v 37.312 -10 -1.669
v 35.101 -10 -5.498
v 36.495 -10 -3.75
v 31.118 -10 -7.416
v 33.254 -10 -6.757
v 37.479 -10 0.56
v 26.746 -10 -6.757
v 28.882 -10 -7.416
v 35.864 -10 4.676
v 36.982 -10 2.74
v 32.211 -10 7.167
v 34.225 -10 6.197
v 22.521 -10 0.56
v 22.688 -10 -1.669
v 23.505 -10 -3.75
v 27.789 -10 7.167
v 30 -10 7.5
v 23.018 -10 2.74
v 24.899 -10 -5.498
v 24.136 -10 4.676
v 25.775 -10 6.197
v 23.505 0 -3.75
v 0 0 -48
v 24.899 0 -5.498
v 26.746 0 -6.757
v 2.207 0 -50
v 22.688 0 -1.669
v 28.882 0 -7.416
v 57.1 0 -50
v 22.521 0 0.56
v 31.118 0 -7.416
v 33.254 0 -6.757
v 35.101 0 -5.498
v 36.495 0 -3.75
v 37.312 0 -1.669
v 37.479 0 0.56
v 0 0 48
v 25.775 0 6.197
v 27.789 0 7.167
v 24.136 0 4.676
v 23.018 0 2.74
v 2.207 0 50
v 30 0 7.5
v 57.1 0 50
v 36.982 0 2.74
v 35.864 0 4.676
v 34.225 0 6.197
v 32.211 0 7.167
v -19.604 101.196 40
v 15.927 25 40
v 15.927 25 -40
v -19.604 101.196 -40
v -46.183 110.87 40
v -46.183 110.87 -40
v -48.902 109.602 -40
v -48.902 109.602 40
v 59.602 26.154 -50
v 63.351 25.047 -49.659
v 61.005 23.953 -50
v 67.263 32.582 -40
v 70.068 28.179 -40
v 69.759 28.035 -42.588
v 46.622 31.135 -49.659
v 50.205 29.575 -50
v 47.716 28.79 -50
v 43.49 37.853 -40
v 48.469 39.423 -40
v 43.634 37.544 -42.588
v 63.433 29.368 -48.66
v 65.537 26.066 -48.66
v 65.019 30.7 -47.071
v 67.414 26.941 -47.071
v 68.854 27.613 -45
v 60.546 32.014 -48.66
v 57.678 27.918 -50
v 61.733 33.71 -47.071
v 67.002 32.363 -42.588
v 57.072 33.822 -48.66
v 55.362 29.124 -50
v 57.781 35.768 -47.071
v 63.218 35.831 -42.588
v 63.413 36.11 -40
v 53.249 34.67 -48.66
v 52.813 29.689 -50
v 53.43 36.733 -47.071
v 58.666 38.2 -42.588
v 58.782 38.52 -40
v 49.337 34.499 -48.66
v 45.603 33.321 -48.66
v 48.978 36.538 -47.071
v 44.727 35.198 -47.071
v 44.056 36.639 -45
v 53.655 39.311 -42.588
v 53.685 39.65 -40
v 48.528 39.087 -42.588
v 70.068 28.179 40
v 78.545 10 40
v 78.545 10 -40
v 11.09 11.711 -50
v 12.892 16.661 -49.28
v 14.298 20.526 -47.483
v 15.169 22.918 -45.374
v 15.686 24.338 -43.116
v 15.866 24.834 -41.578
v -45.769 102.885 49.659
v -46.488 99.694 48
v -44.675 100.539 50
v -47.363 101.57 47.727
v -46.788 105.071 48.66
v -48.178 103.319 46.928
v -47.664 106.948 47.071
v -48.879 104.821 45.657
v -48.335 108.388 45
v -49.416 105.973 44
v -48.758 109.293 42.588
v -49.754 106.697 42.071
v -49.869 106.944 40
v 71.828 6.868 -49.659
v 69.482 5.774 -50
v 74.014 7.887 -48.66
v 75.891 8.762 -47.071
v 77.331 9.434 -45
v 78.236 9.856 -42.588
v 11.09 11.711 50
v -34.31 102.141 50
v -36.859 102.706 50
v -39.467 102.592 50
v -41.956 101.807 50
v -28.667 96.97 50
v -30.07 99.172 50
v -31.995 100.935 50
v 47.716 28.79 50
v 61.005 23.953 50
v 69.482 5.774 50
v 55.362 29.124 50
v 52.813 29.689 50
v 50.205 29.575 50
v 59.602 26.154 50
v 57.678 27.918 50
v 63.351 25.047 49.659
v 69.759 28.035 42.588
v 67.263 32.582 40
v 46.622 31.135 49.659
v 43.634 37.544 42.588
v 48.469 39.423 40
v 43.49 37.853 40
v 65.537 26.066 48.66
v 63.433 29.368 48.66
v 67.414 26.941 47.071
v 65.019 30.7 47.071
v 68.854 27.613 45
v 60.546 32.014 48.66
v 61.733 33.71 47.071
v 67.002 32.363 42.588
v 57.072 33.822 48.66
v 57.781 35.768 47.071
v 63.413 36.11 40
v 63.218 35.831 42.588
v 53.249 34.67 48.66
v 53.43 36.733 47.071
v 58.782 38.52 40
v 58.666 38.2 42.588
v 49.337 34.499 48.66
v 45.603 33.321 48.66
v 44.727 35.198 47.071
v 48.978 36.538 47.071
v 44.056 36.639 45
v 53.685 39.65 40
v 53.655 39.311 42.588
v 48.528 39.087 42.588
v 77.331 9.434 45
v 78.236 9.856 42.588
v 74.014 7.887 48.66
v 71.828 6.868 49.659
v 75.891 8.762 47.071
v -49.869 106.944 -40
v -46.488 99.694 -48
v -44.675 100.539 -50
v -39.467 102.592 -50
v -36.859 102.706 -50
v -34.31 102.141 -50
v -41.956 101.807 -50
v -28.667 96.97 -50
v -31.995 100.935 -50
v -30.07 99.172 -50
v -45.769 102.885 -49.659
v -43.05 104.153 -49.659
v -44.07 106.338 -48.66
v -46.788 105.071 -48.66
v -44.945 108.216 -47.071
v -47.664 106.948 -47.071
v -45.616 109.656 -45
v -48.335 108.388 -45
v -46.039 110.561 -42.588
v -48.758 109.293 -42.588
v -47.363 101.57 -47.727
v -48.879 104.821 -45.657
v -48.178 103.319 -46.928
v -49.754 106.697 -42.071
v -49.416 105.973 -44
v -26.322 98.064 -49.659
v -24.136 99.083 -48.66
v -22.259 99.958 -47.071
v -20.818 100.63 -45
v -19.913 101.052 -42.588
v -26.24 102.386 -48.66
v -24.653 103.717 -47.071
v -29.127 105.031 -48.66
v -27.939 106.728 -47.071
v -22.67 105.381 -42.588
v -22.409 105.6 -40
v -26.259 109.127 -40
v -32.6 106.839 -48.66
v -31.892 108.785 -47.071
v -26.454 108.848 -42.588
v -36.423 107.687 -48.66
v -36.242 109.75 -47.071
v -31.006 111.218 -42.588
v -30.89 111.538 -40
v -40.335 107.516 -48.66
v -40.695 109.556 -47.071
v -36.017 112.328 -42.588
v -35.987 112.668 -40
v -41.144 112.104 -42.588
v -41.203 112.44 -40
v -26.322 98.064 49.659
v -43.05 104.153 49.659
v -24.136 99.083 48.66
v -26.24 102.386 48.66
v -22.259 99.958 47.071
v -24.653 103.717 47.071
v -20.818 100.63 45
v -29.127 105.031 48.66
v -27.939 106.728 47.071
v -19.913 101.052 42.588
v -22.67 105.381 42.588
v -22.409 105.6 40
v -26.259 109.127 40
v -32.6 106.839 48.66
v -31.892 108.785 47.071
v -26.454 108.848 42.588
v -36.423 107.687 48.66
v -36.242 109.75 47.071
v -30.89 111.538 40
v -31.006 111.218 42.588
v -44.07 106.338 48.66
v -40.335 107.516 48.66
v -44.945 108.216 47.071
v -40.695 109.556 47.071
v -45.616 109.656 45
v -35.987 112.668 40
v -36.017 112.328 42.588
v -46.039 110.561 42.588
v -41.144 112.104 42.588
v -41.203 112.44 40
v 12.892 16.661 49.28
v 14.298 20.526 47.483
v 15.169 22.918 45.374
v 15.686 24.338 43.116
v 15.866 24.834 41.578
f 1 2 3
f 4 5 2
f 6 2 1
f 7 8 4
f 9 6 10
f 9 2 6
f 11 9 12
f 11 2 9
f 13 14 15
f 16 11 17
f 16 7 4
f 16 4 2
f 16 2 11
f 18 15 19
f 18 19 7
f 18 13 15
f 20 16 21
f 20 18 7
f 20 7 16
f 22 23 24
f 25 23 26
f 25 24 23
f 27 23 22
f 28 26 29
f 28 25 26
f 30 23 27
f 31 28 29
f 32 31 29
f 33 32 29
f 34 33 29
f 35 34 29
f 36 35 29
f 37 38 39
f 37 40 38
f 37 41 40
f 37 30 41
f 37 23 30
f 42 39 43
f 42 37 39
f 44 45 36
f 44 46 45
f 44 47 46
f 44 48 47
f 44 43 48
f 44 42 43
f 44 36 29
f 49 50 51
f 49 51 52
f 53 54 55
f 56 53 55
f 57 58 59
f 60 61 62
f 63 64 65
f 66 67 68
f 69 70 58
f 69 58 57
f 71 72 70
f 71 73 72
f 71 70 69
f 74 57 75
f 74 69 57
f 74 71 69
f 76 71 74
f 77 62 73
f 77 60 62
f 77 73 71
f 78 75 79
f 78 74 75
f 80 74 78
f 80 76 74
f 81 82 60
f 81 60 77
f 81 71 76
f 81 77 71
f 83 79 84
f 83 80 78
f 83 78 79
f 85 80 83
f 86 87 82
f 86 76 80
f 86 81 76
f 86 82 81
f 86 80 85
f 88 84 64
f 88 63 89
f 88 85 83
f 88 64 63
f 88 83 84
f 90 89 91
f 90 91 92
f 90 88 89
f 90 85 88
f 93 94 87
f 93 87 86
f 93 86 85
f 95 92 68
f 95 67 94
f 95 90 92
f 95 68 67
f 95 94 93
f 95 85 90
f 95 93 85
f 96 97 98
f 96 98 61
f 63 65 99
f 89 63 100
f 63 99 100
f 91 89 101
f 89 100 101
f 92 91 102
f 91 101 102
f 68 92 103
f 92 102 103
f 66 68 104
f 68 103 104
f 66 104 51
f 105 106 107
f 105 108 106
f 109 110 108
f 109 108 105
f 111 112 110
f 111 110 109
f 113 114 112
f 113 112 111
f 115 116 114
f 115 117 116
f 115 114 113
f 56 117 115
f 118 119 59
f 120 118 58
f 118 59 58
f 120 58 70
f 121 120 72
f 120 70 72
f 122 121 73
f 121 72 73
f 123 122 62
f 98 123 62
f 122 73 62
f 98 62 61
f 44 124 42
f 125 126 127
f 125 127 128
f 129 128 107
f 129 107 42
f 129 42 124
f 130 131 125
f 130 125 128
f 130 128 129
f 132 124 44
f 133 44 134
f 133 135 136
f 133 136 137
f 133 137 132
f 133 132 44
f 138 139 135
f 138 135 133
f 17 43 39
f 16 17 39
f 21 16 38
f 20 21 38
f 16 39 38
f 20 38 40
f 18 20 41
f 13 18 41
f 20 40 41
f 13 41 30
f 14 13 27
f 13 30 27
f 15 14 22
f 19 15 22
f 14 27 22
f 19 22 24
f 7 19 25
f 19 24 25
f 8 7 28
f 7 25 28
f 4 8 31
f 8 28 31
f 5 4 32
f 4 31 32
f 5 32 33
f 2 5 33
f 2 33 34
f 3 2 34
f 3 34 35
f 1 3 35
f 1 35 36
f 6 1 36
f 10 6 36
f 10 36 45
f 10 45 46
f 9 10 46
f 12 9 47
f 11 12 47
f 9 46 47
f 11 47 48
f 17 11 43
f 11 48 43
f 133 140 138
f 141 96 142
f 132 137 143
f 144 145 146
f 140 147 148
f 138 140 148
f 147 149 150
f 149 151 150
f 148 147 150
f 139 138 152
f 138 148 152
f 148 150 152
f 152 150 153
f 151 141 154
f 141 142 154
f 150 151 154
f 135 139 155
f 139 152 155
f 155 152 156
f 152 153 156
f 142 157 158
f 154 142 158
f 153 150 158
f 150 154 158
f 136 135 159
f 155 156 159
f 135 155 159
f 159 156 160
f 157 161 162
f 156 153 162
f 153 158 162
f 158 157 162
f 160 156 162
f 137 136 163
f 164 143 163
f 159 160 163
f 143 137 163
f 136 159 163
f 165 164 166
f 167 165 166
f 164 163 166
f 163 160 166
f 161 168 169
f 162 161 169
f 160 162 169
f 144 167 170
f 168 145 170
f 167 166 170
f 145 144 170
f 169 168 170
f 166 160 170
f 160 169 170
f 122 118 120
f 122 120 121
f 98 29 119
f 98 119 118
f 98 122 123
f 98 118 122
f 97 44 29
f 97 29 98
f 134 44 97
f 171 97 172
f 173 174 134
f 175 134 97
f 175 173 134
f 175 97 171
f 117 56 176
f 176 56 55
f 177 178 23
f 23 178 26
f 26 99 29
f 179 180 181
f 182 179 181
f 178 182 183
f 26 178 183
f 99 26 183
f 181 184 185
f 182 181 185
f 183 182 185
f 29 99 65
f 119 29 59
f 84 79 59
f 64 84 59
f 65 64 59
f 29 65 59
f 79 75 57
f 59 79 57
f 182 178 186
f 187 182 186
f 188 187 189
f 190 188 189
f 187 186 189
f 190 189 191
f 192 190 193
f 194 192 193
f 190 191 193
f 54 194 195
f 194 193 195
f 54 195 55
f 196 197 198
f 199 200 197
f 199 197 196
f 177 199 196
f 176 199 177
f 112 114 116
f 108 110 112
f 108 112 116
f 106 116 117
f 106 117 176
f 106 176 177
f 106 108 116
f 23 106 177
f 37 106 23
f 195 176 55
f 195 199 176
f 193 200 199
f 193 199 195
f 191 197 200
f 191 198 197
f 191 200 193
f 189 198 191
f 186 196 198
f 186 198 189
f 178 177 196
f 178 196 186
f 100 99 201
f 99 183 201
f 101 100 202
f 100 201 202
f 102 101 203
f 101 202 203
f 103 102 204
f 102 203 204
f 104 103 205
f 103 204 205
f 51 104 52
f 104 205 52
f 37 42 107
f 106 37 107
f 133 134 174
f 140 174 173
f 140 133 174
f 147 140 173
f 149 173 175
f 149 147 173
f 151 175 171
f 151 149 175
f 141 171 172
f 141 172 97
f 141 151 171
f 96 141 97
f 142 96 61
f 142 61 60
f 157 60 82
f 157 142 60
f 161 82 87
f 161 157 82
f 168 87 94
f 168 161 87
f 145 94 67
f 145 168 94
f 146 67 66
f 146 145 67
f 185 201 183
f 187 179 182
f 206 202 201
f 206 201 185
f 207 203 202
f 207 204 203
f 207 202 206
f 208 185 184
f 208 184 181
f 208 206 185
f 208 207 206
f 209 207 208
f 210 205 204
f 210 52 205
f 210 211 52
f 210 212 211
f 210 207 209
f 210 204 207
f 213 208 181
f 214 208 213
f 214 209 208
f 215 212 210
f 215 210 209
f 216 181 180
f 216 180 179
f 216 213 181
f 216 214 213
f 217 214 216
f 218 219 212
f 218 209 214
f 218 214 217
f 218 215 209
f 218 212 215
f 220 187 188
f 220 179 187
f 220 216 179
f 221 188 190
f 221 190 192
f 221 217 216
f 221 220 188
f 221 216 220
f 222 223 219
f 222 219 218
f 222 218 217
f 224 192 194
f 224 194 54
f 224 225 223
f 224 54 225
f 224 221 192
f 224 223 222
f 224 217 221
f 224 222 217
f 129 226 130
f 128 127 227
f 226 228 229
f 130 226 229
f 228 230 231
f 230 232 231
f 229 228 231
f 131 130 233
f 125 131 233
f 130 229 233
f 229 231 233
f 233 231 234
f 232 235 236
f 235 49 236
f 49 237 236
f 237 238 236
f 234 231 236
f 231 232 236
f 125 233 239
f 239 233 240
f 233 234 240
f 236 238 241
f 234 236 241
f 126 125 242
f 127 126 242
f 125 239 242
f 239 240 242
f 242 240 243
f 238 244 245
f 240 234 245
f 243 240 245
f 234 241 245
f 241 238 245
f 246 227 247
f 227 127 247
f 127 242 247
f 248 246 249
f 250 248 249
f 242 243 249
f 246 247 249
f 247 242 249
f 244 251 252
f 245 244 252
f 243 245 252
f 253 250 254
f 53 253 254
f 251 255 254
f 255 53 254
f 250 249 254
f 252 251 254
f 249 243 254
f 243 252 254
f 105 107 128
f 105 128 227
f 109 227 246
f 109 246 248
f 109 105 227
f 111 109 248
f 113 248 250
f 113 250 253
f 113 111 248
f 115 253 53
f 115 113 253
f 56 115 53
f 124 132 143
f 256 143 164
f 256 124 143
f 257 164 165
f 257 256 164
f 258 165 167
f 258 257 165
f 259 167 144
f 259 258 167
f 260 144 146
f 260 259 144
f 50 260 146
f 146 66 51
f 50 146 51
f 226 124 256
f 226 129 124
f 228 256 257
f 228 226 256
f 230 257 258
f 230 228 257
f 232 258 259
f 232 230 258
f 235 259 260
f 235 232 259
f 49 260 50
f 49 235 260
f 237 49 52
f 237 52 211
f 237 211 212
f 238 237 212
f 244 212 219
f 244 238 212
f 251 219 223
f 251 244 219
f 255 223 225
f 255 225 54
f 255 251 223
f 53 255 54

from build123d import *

# Parameters (mm, degrees)
BOSS_EXTRUDE1_DEPTH = 50
SKETCH4_R           = 7.5
BOSS_EXTRUDE2_DEPTH = 10
FILLET1_R           = 10
CHAMFER1_SIZE       = 2


with BuildPart() as part:
    # Sketch3 → Boss-Extrude1 (new, symmetric)
    with BuildSketch(Plane.XY):
        with BuildLine():
            Line((-50.714191409, 108.756934444), (0, 0))
            Line((0, 0), (57.1, 0))
            Line((57.1, 0), (78.545069205, 10))
            Line((78.545069205, 10), (70.068082541, 28.178956567))
            ThreePointArc((70.068082541, 28.178956567), (58.782329667, 38.520443748), (43.489561565, 37.852747073))
            Line((43.489561565, 37.852747073), (15.92675652, 25))
            Line((15.92675652, 25), (-19.604131498, 101.196235247))
            ThreePointArc((-19.604131498, 101.196235247), (-30.889884372, 111.537722428), (-46.182652474, 110.870025753))
            Line((-46.182652474, 110.870025753), (-50.714191409, 108.756934444))
        make_face()
    extrude(amount=BOSS_EXTRUDE1_DEPTH, both=True)

    # Sketch4 → Boss-Extrude2 (add)
    with BuildSketch(Plane.XZ):
        with Locations(Location((30, 0, 0), (0, 0, 90))):
            Circle(SKETCH4_R)
    extrude(amount=BOSS_EXTRUDE2_DEPTH)

    # Fillet1
    fillet1_edges = [part.edges().sort_by_distance(p)[0] for p in [
        (29.708159043, 31.426373536, -50),
        (58.782329667, 38.520443748, -50),
        (74.306575873, 19.089478283, -50),
        (-48.448421941, 109.813480099, -50),
        (74.306575873, 19.089478283, 50),
        (58.782329667, 38.520443748, 50),
        (29.708159043, 31.426373536, 50),
        (-1.838687489, 63.098117624, 50),
        (-30.889884372, 111.537722428, 50),
        (-48.448421941, 109.813480099, 50),
        (-30.889884372, 111.537722428, -50),
        (-1.838687489, 63.098117624, -50),
    ]]
    fillet(fillet1_edges, radius=FILLET1_R)

    # Chamfer1
    chamfer1_edges = [part.edges().sort_by_distance(p)[0] for p in [
        (-23.244004396, 49.846928287, -50),
        (-23.244004396, 49.846928287, 50),
        (-50.714191409, 108.756934444, 0),
        (-49.476371179, 106.102420395, 47.071067812),
        (-49.476371179, 106.102420395, -47.071067812),
    ]]
    chamfer(chamfer1_edges, length=CHAMFER1_SIZE)


solid = part.part
